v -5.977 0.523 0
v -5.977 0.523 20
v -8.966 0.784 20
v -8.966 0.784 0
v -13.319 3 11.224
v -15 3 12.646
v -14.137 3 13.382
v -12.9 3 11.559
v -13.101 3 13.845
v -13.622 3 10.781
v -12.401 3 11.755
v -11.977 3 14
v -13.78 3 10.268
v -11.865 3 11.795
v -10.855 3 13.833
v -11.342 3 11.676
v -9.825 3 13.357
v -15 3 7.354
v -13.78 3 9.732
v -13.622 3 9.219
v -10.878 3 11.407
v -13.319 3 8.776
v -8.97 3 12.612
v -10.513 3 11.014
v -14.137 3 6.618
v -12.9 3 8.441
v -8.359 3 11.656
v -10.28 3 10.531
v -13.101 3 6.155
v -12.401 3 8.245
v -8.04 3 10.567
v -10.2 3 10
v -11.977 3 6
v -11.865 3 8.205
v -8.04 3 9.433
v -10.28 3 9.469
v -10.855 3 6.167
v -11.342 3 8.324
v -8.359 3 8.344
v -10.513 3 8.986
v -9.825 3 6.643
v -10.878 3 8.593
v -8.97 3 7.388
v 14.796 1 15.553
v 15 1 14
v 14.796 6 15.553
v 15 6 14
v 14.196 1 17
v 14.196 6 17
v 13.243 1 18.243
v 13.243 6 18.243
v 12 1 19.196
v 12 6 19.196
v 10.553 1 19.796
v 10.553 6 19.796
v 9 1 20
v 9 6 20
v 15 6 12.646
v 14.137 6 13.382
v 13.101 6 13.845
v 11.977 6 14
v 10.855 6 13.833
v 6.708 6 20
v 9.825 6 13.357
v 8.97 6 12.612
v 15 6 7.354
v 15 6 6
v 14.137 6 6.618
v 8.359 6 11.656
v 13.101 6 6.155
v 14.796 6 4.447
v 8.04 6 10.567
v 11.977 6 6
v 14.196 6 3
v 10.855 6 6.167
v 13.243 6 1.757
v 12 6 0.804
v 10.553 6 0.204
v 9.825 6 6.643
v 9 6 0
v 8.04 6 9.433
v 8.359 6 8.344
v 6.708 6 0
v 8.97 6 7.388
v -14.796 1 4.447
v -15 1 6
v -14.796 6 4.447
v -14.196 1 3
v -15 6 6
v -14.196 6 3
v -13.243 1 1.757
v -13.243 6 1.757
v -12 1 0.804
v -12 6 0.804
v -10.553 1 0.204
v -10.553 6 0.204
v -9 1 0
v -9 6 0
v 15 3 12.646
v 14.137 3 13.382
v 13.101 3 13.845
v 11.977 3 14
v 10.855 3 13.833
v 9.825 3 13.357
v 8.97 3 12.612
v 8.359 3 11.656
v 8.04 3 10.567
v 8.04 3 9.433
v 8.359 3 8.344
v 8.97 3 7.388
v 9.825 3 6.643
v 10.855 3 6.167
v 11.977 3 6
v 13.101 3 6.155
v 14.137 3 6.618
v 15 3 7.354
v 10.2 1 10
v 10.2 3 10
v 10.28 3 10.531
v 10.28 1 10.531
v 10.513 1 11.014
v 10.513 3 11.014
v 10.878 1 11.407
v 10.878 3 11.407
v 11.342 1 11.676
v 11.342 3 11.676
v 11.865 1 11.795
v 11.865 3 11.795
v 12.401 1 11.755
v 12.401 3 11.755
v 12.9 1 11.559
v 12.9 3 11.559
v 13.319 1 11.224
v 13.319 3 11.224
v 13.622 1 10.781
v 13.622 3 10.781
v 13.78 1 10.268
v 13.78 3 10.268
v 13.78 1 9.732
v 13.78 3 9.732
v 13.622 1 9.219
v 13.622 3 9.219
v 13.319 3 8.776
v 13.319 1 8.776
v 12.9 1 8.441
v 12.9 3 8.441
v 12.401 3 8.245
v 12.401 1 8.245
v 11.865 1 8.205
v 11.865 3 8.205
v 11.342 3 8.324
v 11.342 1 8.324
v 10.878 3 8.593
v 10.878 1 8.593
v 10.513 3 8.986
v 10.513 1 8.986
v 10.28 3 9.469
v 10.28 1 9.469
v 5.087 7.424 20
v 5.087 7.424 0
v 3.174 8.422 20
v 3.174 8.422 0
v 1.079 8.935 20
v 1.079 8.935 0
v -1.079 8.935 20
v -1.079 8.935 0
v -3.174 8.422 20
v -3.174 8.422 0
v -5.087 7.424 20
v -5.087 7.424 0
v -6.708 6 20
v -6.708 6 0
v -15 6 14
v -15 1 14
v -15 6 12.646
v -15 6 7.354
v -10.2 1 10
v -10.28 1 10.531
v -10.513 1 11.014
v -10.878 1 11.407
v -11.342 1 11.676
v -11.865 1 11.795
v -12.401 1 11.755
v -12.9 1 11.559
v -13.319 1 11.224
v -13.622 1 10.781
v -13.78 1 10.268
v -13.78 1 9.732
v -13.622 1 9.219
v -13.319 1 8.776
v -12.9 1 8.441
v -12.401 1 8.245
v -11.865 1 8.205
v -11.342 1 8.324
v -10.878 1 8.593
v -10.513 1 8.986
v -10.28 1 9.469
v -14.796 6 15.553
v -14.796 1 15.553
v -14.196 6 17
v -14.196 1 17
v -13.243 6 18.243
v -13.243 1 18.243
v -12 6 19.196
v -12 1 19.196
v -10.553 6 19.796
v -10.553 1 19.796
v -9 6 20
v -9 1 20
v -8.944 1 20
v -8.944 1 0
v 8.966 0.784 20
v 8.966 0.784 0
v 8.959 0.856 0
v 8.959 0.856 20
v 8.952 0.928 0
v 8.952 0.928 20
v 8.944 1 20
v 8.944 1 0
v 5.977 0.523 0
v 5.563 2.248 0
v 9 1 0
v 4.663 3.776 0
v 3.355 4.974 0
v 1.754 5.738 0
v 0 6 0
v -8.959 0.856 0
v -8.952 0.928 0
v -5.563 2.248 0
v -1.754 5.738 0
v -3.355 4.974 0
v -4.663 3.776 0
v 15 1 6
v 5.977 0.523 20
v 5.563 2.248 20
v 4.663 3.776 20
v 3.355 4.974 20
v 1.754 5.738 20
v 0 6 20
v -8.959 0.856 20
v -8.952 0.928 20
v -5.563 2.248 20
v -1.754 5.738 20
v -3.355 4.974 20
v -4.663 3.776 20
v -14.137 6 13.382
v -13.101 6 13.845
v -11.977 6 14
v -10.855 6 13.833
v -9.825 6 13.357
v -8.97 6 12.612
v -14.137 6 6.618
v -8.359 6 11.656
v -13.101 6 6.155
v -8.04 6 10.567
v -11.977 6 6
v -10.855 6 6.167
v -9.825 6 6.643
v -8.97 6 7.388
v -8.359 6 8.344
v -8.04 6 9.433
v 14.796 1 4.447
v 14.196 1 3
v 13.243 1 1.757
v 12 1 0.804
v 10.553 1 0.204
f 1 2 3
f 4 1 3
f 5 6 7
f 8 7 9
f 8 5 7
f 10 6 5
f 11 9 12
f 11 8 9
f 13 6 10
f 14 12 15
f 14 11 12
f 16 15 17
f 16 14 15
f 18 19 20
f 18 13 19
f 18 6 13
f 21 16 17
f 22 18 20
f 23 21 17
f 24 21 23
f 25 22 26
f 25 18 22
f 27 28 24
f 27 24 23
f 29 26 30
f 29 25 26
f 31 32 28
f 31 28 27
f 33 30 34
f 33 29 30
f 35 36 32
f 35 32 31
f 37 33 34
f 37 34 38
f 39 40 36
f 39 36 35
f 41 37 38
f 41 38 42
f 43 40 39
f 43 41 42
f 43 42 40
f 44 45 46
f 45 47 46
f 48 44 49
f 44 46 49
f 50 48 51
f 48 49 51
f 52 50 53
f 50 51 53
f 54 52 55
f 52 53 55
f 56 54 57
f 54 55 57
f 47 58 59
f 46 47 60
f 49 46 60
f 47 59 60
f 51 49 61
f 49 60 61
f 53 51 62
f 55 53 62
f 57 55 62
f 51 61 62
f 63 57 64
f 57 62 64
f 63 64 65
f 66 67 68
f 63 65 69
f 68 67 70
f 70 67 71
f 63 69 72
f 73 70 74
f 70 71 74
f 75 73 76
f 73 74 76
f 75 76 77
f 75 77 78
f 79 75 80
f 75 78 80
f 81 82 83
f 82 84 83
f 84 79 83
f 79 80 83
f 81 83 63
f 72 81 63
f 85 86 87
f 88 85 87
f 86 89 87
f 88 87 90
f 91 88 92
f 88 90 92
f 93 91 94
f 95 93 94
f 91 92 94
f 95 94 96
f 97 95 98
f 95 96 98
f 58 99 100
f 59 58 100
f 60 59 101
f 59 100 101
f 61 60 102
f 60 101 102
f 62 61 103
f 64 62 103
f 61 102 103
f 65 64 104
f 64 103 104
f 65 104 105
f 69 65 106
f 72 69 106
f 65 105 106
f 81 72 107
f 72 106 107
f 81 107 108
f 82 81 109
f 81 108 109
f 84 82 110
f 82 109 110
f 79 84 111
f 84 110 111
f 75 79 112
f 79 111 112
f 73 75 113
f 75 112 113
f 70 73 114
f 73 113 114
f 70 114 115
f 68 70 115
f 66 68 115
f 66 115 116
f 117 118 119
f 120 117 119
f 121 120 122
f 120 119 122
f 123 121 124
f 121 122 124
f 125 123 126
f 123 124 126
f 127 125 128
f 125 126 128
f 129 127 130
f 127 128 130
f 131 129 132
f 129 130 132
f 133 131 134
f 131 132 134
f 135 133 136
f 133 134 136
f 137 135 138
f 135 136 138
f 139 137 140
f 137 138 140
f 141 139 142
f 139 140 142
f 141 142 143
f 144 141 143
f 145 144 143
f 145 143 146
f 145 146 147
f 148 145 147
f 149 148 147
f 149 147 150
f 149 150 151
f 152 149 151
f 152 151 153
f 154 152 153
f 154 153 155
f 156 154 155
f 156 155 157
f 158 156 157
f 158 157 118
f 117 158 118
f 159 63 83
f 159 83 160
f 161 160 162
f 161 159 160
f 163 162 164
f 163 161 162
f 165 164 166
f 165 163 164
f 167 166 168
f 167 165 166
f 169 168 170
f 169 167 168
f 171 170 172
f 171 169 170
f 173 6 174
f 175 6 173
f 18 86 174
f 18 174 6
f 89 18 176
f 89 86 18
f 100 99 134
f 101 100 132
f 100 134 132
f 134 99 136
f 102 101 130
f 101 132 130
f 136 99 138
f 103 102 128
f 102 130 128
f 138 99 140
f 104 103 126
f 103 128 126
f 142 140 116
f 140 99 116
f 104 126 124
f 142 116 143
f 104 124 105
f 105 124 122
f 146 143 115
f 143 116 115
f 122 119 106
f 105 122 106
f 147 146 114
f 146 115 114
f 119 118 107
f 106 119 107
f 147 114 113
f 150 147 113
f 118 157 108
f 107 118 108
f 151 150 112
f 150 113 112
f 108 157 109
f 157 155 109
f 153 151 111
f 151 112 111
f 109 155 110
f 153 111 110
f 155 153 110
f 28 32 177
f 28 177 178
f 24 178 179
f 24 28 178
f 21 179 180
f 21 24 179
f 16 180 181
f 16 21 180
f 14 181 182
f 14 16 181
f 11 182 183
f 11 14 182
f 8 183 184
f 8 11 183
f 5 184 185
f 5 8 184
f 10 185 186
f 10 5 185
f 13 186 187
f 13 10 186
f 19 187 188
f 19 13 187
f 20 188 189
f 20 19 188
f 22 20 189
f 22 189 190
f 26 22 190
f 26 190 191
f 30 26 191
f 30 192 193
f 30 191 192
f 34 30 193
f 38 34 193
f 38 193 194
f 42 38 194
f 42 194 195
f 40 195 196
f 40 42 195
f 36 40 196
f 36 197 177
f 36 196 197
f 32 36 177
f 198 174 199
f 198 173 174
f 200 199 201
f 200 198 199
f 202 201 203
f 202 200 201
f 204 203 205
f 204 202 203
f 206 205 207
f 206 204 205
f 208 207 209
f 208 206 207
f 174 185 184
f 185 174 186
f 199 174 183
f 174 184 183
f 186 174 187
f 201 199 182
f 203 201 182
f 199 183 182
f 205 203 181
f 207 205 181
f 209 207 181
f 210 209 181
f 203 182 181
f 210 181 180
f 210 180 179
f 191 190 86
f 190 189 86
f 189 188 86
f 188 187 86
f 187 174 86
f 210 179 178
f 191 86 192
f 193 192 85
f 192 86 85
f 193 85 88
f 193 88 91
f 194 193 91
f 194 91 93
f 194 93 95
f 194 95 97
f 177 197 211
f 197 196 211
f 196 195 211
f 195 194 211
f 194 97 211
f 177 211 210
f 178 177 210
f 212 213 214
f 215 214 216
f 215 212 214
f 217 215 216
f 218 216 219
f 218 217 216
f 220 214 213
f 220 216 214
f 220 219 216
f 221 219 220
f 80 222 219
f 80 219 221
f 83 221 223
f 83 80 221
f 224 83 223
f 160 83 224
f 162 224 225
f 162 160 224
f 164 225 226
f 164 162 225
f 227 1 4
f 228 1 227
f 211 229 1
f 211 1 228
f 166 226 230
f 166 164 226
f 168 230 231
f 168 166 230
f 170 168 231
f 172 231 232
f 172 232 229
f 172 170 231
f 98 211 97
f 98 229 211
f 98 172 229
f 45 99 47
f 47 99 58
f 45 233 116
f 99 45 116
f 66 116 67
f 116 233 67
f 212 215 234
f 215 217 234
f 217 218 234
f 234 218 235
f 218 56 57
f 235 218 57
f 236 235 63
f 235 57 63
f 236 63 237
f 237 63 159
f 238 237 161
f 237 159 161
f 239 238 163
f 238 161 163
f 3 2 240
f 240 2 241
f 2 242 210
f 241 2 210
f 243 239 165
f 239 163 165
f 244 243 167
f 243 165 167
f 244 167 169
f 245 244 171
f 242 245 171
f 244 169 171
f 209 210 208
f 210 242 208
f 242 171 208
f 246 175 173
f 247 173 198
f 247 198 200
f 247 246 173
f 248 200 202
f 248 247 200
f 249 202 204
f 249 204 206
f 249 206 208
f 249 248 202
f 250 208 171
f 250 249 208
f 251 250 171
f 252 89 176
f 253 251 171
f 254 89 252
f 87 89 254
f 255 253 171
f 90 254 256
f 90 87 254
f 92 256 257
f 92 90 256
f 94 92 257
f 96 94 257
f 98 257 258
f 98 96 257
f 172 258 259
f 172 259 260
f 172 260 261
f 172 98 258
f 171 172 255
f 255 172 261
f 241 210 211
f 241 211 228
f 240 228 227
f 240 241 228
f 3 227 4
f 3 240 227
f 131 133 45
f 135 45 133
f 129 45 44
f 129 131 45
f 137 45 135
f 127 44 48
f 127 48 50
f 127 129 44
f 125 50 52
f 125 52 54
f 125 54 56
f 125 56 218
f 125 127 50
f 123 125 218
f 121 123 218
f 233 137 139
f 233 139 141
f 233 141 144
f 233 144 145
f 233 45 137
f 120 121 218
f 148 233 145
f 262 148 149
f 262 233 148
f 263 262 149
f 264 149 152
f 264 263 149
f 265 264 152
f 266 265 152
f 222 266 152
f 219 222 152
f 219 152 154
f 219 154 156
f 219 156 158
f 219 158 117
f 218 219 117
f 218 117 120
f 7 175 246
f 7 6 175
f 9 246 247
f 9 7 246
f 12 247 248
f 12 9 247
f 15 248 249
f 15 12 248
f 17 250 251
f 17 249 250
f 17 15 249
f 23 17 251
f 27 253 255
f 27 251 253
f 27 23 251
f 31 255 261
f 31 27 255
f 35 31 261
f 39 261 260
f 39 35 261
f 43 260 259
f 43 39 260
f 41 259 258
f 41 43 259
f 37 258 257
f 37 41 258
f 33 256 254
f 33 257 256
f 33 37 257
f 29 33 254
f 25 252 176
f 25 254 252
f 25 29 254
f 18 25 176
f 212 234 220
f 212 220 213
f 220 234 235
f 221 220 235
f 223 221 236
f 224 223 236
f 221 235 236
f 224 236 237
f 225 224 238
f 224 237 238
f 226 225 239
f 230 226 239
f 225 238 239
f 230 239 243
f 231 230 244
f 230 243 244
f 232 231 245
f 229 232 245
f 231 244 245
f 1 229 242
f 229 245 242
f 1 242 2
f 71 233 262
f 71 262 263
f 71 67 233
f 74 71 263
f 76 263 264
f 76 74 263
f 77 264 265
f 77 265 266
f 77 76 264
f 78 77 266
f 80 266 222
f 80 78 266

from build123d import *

# Parameters (mm, degrees)
CYLINDER095_R            = 4
CYLINDER095_DEPTH        = 20
CYLINDER001_W            = 6
CYLINDER001_H            = 20
CYLINDER001_ANGLE        = 180
CYLINDER003_R            = 1.8
CYLINDER003_DEPTH        = 50
CYLINDER_W               = 9
CYLINDER_H               = 20
CYLINDER_ANGLE           = 170
CYLINDER_PLACEMENT_ANGLE = 5
BOX_W                    = 9
BOX_H                    = 5
BOX_DEPTH                = 20
FILLET_R                 = 6


with BuildPart() as bolt_head_cylinder:
    # Cylinder095 → Cylinder095 (new body)
    with BuildSketch(Plane(origin=(-12, 3, 10), x_dir=(1, 0, 0), z_dir=(0, 1, 0))):
        Circle(CYLINDER095_R)
    extrude(amount=CYLINDER095_DEPTH)


with BuildPart() as top_petals_hole_fusion:
    # Part__Mirroring004: instance of bolt head cylinder
    add(bolt_head_cylinder.part.mirror(Plane(origin=(0, 0, 0), x_dir=(0, -1, 0), z_dir=(1, 0, 0))))

    # Fusion002: union bolt head cylinder
    add(bolt_head_cylinder.part)


with BuildPart() as hole_cylinder:
    # Cylinder001 → Cylinder001 (revolve)
    with BuildSketch(Plane.XZ):
        with Locations((3, 10)):
            Rectangle(CYLINDER001_W, CYLINDER001_H)
    revolve(axis=Axis((0, 0, 0), (0, 0, 1)), revolution_arc=CYLINDER001_ANGLE)


with BuildPart() as bolt_hole:
    # Cylinder003 → Cylinder003 (new body)
    with BuildSketch(Plane(origin=(-12, 20, 10), x_dir=(1, 0, 0), z_dir=(0, -1, 0))):
        Circle(CYLINDER003_R)
    extrude(amount=CYLINDER003_DEPTH)


with BuildPart() as part_mirroring003:
    # Part__Mirroring003: instance of bolt hole
    add(bolt_hole.part.mirror(Plane(origin=(0, 0, 0), x_dir=(0, -1, 0), z_dir=(1, 0, 0))))


with BuildPart() as hole_fusion:
    # Fusion base: copy of bolt hole
    add(bolt_hole.part)

    # Fusion: union hole cylinder, Part__Mirroring003
    add(hole_cylinder.part)
    add(part_mirroring003.part)


with BuildPart() as external_cylinder:
    # Cylinder → Cylinder (revolve)
    with BuildSketch(Plane.XZ):
        with Locations((4.5, 10)):
            Rectangle(CYLINDER_W, CYLINDER_H)
    revolve(axis=Axis((0, 0, 0), (0, 0, 1)), revolution_arc=CYLINDER_ANGLE)


with BuildPart() as external_cylinder_1:
    # Cylinder placement: moved
    add(external_cylinder.part.rotate(Axis((0, 0, 0), (0, 0, 1)), CYLINDER_PLACEMENT_ANGLE))


with BuildPart() as petal_fillet:
    # Box → Box (new body)
    with BuildSketch(Plane(origin=(-15, 1, 0), x_dir=(1, 0, 0), z_dir=(0, 0, 1))):
        with Locations((4.5, 2.5)):
            Rectangle(BOX_W, BOX_H)
    extrude(amount=BOX_DEPTH)

    # Fillet
    fillet_edges = [petal_fillet.edges().sort_by_distance(p)[0] for p in [
        (-15, 3.5, 20),
        (-15, 3.5, 0),
    ]]
    fillet(fillet_edges, radius=FILLET_R)


with BuildPart() as part_mirroring002:
    # Part__Mirroring002: instance of petal fillet
    add(petal_fillet.part.mirror(Plane(origin=(0, 0, 0), x_dir=(0, -1, 0), z_dir=(1, 0, 0))))


with BuildPart() as top_half_cut:
    # Fusion001 base: copy of petal fillet
    add(petal_fillet.part)

    # Fusion001: union external cylinder, Part__Mirroring002
    add(external_cylinder_1.part)
    add(part_mirroring002.part)

    # Cut: cut hole fusion
    add(hole_fusion.part, mode=Mode.SUBTRACT)

    # Cut001: cut top petals hole fusion
    add(top_petals_hole_fusion.part, mode=Mode.SUBTRACT)


solid = top_half_cut.part
